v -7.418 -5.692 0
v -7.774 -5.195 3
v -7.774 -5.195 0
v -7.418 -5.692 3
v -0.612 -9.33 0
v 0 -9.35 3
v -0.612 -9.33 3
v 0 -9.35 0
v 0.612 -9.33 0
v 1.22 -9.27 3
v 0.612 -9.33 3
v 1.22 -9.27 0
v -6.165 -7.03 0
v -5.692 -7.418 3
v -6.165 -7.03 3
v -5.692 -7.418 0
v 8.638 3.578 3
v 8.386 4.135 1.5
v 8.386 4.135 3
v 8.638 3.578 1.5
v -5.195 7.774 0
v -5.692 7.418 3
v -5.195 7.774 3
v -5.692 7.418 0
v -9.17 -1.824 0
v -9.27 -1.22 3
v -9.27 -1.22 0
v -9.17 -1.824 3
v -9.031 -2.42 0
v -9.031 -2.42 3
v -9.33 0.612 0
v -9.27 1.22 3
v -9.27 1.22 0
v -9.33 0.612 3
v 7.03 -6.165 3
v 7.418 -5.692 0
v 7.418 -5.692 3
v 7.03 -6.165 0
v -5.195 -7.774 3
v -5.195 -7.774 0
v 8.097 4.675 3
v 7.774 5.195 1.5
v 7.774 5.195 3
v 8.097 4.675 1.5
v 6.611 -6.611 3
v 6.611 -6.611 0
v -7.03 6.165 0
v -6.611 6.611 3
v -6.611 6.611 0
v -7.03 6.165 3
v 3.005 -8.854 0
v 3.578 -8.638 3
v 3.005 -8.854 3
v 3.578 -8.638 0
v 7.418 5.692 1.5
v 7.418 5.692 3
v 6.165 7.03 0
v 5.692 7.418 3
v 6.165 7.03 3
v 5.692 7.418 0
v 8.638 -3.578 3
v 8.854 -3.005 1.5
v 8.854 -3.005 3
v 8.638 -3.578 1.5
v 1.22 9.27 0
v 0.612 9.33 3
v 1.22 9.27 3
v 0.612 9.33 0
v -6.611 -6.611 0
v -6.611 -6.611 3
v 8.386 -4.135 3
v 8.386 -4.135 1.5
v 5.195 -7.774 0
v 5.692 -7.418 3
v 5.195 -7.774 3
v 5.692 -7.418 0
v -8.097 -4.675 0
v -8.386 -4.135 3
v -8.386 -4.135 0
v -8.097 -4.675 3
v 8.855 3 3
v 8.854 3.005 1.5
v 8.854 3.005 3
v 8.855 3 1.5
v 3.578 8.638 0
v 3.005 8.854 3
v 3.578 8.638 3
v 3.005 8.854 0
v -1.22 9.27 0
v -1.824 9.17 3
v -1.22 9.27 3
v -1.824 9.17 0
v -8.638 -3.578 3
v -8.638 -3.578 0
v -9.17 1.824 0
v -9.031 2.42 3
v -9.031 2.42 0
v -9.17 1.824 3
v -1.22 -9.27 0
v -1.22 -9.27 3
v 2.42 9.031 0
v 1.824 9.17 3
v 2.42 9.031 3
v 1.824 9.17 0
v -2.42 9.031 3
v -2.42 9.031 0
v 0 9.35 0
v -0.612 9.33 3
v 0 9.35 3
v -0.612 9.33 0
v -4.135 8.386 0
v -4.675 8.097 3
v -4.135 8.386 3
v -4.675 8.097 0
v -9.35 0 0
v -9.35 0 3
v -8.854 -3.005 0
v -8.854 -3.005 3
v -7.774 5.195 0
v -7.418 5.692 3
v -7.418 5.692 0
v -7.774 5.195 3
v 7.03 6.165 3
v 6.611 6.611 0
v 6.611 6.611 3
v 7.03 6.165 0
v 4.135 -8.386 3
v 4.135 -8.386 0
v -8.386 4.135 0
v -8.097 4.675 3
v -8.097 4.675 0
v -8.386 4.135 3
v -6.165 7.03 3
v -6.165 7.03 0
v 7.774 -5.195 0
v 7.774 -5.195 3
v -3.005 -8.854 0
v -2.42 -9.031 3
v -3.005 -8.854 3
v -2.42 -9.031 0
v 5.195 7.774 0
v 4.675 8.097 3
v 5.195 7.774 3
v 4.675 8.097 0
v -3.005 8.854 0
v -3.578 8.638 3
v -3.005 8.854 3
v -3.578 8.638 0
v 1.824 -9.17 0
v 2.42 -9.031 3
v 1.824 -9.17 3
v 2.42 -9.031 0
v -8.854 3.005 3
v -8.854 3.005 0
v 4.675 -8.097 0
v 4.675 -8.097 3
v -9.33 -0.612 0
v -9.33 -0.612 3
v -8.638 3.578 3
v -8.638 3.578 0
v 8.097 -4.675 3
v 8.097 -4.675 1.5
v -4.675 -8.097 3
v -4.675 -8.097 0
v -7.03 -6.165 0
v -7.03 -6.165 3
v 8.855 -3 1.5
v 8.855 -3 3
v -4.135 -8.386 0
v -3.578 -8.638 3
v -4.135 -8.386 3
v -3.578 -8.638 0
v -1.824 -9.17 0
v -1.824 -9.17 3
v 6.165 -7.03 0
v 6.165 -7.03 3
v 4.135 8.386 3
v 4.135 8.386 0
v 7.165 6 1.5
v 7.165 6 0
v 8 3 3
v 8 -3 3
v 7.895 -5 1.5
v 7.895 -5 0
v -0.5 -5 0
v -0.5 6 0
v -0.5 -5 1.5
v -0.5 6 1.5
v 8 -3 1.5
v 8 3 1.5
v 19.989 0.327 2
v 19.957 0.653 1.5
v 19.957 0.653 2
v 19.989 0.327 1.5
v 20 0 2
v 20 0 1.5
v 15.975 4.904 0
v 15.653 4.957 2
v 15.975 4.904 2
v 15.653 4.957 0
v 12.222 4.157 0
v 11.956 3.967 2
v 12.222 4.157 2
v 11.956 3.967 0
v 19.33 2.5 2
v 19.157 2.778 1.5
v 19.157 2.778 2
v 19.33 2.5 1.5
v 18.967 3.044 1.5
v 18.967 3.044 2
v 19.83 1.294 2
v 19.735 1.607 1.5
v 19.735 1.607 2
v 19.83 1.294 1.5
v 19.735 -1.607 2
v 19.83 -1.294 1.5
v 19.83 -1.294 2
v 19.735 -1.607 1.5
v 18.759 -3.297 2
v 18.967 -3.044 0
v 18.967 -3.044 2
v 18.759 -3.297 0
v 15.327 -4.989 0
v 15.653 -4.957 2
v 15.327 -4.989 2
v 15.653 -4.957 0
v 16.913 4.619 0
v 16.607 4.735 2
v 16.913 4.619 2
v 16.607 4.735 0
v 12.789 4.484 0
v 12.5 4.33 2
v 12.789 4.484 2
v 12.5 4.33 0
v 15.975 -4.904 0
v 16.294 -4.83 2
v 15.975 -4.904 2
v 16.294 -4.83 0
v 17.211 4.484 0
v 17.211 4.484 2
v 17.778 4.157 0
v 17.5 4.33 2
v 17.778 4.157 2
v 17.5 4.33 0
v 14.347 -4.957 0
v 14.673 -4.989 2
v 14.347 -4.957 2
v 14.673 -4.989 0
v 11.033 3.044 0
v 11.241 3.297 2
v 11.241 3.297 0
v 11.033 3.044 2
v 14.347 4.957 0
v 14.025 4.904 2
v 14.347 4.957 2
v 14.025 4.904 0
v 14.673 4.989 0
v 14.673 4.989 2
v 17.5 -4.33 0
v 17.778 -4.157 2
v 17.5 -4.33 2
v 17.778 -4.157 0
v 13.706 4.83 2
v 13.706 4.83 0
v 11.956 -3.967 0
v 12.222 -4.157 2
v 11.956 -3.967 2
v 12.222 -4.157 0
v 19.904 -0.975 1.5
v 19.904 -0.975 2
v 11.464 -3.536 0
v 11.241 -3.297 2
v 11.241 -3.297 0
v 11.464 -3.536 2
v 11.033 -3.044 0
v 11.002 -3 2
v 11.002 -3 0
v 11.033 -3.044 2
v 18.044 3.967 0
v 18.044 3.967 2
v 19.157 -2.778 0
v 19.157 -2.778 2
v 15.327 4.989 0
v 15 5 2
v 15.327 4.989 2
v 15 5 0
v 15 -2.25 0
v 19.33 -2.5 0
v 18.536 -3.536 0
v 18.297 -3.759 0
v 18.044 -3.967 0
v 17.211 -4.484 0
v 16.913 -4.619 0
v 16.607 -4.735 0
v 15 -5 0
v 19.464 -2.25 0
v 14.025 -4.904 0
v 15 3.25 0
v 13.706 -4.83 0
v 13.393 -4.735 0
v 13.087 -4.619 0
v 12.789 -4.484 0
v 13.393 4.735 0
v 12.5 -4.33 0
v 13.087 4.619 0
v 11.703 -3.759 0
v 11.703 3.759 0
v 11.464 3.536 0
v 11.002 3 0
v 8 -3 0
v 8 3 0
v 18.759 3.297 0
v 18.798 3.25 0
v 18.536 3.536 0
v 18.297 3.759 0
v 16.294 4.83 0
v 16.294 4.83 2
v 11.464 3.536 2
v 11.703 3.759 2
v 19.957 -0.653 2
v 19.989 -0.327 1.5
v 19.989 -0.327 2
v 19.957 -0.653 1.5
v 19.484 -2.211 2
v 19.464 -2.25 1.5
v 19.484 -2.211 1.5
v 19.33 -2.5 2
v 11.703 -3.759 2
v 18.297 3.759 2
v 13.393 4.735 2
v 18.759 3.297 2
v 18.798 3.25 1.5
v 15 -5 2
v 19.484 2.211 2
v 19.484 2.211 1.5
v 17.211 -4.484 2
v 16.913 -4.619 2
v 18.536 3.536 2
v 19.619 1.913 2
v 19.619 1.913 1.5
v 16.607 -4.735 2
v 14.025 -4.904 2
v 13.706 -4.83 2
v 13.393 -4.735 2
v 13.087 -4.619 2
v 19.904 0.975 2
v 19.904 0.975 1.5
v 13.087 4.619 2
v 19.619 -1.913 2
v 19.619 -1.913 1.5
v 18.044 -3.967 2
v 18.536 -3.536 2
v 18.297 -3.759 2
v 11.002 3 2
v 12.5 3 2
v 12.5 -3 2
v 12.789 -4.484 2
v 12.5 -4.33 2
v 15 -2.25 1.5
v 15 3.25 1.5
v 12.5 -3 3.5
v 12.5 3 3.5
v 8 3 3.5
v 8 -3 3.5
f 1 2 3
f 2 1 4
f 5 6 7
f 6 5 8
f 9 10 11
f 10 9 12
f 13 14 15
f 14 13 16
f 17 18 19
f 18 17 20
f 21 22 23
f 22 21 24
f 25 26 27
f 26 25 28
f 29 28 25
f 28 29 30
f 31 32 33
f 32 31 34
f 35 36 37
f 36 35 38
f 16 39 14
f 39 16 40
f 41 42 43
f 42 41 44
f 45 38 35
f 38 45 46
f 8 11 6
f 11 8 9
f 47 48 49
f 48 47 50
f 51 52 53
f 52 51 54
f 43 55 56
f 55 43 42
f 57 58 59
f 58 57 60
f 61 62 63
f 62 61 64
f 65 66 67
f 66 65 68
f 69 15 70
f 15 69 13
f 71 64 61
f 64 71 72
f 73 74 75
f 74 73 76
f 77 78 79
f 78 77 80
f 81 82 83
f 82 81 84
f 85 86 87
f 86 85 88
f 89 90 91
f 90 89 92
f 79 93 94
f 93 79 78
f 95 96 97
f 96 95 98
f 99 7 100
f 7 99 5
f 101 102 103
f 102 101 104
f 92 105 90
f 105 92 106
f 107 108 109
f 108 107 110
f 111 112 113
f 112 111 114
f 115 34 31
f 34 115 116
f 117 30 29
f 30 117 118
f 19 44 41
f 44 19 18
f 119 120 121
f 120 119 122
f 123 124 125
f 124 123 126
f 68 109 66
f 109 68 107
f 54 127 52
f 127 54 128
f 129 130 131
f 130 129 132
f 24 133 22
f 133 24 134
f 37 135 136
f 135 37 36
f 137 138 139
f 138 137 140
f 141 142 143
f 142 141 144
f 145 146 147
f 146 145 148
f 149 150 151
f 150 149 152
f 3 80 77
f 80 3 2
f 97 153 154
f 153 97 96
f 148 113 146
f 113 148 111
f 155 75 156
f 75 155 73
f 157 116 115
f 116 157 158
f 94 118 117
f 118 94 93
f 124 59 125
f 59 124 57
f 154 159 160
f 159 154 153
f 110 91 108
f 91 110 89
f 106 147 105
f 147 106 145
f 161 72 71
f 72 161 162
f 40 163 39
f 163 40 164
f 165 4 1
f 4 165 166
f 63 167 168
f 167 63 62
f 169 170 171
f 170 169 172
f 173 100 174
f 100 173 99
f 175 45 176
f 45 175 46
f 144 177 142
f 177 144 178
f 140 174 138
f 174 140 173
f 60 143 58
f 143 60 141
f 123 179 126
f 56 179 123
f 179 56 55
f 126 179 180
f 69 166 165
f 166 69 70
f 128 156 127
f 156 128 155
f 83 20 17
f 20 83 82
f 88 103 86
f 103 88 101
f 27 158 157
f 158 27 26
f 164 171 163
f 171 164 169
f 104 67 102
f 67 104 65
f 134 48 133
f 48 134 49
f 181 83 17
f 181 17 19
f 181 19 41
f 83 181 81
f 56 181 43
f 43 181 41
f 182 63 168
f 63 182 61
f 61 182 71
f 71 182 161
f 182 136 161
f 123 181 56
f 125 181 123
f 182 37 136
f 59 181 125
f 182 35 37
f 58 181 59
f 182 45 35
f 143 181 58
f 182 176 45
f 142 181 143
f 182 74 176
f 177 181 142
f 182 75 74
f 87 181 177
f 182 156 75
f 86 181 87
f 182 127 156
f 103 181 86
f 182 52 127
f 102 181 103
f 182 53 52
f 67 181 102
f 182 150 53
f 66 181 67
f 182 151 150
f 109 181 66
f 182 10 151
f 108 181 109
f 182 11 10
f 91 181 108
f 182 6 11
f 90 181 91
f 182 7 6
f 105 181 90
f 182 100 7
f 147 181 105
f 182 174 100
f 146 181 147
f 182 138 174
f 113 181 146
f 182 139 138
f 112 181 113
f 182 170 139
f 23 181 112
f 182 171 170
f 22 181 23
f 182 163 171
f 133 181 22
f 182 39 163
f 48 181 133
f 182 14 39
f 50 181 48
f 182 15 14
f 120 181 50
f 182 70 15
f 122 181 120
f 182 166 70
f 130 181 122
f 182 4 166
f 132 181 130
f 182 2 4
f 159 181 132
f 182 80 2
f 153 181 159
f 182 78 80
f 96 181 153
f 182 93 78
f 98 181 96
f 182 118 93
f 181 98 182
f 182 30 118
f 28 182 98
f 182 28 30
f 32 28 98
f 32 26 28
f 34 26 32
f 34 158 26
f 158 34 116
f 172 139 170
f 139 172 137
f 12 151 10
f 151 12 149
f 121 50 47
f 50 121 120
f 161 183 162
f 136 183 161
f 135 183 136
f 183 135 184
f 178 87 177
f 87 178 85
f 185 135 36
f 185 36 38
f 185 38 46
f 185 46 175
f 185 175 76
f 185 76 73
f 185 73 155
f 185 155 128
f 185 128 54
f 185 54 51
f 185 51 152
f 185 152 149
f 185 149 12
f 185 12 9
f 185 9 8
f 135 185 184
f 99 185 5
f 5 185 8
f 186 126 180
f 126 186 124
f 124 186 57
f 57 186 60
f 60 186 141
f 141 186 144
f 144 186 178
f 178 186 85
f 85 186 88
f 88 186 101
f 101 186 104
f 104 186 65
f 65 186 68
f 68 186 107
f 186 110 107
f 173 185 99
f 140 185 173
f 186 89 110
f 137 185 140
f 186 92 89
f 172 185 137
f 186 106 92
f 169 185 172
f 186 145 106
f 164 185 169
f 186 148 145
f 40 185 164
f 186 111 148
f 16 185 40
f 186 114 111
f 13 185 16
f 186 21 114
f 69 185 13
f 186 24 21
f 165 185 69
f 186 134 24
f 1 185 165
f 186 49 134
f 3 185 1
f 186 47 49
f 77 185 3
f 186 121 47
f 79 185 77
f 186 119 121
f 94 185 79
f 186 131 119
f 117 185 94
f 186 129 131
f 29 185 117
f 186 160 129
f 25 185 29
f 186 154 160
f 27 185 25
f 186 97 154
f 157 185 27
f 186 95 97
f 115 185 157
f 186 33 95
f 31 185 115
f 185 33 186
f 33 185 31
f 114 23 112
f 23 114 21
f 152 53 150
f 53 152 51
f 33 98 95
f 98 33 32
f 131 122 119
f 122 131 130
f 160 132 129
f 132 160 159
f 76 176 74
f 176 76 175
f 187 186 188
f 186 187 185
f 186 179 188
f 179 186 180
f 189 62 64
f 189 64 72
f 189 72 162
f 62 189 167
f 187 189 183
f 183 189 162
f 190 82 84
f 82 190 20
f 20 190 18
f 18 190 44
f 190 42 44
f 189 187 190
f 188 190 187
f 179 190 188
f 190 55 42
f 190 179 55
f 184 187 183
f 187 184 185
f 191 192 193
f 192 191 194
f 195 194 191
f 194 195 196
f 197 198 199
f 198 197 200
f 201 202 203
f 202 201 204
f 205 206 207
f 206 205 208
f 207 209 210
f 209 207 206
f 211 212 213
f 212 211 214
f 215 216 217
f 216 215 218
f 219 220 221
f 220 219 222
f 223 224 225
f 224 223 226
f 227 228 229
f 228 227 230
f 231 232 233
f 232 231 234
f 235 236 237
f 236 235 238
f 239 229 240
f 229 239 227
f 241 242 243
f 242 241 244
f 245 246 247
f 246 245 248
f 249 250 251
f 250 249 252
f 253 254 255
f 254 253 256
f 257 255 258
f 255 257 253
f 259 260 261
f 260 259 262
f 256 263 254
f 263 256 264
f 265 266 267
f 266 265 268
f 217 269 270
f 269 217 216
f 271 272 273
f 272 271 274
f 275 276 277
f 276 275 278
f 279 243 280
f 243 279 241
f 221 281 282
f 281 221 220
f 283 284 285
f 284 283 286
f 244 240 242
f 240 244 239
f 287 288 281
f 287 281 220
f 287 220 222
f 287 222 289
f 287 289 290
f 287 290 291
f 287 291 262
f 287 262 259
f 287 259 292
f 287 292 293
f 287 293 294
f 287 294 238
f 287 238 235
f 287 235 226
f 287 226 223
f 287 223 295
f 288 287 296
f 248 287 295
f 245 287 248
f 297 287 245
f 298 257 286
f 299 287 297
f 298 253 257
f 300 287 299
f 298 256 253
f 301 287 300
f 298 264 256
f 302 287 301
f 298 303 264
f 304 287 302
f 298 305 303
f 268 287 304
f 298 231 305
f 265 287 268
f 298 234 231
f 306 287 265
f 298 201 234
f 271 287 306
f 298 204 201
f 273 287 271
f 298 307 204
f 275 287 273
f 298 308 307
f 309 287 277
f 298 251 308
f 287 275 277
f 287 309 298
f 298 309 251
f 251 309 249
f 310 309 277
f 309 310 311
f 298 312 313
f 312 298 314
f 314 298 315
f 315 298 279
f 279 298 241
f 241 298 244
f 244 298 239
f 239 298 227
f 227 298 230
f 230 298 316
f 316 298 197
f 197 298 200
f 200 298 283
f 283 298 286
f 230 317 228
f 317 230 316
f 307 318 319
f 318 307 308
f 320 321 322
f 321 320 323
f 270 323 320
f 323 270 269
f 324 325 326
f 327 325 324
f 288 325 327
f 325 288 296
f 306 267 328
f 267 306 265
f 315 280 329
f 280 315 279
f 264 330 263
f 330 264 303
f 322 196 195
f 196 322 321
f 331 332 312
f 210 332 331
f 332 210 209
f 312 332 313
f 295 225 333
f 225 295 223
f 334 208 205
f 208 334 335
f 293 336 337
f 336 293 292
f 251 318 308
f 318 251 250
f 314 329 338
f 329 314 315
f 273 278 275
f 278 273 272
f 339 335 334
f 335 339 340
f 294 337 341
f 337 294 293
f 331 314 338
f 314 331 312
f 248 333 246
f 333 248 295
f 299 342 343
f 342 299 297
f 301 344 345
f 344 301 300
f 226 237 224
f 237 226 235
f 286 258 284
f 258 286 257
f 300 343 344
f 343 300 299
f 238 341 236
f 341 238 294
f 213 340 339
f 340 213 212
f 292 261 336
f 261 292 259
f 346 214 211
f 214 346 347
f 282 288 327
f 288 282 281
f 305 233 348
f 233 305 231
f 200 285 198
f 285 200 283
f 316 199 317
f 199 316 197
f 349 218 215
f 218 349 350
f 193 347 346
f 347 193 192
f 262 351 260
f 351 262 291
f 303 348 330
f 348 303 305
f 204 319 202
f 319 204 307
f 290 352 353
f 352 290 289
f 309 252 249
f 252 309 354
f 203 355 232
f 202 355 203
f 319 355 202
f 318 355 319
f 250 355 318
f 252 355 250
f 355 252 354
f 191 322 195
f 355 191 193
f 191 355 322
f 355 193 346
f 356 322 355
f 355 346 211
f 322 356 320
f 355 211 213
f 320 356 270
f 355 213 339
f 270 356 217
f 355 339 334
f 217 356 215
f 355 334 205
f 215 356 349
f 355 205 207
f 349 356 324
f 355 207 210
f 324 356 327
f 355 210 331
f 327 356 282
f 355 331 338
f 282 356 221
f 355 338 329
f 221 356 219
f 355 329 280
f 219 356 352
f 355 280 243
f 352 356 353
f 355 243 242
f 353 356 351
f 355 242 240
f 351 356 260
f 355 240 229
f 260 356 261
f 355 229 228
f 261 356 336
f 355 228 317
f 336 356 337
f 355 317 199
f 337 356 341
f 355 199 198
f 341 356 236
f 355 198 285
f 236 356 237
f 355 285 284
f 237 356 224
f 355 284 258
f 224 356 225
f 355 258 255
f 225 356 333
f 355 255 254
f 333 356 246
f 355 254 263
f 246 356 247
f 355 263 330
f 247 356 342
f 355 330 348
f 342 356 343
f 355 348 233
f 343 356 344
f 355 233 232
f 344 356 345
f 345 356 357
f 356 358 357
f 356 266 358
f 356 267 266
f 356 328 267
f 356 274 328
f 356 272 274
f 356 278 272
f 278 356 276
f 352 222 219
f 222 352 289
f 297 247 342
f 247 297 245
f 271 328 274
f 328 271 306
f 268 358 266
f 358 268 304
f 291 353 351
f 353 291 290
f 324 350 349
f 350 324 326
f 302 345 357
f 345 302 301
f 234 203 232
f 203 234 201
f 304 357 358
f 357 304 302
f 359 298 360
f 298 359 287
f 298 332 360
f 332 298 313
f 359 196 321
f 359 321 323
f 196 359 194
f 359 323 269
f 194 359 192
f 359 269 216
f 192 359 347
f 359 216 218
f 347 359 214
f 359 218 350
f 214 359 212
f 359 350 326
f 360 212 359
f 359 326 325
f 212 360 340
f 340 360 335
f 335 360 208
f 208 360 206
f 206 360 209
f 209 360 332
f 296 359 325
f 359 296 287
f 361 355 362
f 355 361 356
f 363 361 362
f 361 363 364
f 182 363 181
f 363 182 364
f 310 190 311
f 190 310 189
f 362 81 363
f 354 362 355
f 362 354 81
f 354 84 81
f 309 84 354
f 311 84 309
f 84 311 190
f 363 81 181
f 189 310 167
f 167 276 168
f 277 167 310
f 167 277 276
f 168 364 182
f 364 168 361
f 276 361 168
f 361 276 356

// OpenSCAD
// Snap-on tubing clip for a 12.7 mm (1/2 inch) lab stand rod
// Print orientation: flat on bed, extrusion along +Z

$fn = 96;

// ---- Dimensions (mm) ----
rod_id      = 12.7;   // rod ring inner diameter
rod_wall    = 3;      // rod ring wall thickness
rod_od      = rod_id + 2 * rod_wall;    // 18.7 mm outer diameter

tube_id     = 6;      // tubing ring inner diameter
tube_wall   = 2;      // tubing ring wall thickness
tube_od     = tube_id + 2 * tube_wall;  // 10 mm outer diameter

bridge_w    = 6;      // bridge width in Y
bridge_x0   = 8;      // bridge start in X
bridge_x1   = 12;     // bridge end in X

eps         = 0.5;    // cutter overshoot past faces

// ---- Model ----
union() {
    // Rod ring with 10 mm opening cut out of -X side
    difference() {
        translate([0, 0, 0])
            cylinder(d = rod_od, h = rod_wall);
        translate([-eps, 0, -eps])
            hull() {
                for (y = [-5, 5])
                    translate([0, y, 0])
                        cube([10 + 2 * eps, 1, 1 + 2 * eps]);
            }
    }

    // Tubing ring with 4.5 mm opening cut out of +X side
    difference() {
        translate([15, 0, 0])
            cylinder(d = tube_od, h = tube_wall);
        translate([15, 0, -eps])
            hull() {
                for (y = [-2.25, 2.25])
                    translate([0, y, 0])
                        cube([4.5 + 2 * eps, 1, 1 + 2 * eps]);
            }
    }

    // Solid bridge between x = 8 and x = 12
    translate([bridge_x0, -bridge_w / 2, 0])
        cube([bridge_x1 - bridge_x0 + eps, bridge_w, rod_wall + eps]);
}
